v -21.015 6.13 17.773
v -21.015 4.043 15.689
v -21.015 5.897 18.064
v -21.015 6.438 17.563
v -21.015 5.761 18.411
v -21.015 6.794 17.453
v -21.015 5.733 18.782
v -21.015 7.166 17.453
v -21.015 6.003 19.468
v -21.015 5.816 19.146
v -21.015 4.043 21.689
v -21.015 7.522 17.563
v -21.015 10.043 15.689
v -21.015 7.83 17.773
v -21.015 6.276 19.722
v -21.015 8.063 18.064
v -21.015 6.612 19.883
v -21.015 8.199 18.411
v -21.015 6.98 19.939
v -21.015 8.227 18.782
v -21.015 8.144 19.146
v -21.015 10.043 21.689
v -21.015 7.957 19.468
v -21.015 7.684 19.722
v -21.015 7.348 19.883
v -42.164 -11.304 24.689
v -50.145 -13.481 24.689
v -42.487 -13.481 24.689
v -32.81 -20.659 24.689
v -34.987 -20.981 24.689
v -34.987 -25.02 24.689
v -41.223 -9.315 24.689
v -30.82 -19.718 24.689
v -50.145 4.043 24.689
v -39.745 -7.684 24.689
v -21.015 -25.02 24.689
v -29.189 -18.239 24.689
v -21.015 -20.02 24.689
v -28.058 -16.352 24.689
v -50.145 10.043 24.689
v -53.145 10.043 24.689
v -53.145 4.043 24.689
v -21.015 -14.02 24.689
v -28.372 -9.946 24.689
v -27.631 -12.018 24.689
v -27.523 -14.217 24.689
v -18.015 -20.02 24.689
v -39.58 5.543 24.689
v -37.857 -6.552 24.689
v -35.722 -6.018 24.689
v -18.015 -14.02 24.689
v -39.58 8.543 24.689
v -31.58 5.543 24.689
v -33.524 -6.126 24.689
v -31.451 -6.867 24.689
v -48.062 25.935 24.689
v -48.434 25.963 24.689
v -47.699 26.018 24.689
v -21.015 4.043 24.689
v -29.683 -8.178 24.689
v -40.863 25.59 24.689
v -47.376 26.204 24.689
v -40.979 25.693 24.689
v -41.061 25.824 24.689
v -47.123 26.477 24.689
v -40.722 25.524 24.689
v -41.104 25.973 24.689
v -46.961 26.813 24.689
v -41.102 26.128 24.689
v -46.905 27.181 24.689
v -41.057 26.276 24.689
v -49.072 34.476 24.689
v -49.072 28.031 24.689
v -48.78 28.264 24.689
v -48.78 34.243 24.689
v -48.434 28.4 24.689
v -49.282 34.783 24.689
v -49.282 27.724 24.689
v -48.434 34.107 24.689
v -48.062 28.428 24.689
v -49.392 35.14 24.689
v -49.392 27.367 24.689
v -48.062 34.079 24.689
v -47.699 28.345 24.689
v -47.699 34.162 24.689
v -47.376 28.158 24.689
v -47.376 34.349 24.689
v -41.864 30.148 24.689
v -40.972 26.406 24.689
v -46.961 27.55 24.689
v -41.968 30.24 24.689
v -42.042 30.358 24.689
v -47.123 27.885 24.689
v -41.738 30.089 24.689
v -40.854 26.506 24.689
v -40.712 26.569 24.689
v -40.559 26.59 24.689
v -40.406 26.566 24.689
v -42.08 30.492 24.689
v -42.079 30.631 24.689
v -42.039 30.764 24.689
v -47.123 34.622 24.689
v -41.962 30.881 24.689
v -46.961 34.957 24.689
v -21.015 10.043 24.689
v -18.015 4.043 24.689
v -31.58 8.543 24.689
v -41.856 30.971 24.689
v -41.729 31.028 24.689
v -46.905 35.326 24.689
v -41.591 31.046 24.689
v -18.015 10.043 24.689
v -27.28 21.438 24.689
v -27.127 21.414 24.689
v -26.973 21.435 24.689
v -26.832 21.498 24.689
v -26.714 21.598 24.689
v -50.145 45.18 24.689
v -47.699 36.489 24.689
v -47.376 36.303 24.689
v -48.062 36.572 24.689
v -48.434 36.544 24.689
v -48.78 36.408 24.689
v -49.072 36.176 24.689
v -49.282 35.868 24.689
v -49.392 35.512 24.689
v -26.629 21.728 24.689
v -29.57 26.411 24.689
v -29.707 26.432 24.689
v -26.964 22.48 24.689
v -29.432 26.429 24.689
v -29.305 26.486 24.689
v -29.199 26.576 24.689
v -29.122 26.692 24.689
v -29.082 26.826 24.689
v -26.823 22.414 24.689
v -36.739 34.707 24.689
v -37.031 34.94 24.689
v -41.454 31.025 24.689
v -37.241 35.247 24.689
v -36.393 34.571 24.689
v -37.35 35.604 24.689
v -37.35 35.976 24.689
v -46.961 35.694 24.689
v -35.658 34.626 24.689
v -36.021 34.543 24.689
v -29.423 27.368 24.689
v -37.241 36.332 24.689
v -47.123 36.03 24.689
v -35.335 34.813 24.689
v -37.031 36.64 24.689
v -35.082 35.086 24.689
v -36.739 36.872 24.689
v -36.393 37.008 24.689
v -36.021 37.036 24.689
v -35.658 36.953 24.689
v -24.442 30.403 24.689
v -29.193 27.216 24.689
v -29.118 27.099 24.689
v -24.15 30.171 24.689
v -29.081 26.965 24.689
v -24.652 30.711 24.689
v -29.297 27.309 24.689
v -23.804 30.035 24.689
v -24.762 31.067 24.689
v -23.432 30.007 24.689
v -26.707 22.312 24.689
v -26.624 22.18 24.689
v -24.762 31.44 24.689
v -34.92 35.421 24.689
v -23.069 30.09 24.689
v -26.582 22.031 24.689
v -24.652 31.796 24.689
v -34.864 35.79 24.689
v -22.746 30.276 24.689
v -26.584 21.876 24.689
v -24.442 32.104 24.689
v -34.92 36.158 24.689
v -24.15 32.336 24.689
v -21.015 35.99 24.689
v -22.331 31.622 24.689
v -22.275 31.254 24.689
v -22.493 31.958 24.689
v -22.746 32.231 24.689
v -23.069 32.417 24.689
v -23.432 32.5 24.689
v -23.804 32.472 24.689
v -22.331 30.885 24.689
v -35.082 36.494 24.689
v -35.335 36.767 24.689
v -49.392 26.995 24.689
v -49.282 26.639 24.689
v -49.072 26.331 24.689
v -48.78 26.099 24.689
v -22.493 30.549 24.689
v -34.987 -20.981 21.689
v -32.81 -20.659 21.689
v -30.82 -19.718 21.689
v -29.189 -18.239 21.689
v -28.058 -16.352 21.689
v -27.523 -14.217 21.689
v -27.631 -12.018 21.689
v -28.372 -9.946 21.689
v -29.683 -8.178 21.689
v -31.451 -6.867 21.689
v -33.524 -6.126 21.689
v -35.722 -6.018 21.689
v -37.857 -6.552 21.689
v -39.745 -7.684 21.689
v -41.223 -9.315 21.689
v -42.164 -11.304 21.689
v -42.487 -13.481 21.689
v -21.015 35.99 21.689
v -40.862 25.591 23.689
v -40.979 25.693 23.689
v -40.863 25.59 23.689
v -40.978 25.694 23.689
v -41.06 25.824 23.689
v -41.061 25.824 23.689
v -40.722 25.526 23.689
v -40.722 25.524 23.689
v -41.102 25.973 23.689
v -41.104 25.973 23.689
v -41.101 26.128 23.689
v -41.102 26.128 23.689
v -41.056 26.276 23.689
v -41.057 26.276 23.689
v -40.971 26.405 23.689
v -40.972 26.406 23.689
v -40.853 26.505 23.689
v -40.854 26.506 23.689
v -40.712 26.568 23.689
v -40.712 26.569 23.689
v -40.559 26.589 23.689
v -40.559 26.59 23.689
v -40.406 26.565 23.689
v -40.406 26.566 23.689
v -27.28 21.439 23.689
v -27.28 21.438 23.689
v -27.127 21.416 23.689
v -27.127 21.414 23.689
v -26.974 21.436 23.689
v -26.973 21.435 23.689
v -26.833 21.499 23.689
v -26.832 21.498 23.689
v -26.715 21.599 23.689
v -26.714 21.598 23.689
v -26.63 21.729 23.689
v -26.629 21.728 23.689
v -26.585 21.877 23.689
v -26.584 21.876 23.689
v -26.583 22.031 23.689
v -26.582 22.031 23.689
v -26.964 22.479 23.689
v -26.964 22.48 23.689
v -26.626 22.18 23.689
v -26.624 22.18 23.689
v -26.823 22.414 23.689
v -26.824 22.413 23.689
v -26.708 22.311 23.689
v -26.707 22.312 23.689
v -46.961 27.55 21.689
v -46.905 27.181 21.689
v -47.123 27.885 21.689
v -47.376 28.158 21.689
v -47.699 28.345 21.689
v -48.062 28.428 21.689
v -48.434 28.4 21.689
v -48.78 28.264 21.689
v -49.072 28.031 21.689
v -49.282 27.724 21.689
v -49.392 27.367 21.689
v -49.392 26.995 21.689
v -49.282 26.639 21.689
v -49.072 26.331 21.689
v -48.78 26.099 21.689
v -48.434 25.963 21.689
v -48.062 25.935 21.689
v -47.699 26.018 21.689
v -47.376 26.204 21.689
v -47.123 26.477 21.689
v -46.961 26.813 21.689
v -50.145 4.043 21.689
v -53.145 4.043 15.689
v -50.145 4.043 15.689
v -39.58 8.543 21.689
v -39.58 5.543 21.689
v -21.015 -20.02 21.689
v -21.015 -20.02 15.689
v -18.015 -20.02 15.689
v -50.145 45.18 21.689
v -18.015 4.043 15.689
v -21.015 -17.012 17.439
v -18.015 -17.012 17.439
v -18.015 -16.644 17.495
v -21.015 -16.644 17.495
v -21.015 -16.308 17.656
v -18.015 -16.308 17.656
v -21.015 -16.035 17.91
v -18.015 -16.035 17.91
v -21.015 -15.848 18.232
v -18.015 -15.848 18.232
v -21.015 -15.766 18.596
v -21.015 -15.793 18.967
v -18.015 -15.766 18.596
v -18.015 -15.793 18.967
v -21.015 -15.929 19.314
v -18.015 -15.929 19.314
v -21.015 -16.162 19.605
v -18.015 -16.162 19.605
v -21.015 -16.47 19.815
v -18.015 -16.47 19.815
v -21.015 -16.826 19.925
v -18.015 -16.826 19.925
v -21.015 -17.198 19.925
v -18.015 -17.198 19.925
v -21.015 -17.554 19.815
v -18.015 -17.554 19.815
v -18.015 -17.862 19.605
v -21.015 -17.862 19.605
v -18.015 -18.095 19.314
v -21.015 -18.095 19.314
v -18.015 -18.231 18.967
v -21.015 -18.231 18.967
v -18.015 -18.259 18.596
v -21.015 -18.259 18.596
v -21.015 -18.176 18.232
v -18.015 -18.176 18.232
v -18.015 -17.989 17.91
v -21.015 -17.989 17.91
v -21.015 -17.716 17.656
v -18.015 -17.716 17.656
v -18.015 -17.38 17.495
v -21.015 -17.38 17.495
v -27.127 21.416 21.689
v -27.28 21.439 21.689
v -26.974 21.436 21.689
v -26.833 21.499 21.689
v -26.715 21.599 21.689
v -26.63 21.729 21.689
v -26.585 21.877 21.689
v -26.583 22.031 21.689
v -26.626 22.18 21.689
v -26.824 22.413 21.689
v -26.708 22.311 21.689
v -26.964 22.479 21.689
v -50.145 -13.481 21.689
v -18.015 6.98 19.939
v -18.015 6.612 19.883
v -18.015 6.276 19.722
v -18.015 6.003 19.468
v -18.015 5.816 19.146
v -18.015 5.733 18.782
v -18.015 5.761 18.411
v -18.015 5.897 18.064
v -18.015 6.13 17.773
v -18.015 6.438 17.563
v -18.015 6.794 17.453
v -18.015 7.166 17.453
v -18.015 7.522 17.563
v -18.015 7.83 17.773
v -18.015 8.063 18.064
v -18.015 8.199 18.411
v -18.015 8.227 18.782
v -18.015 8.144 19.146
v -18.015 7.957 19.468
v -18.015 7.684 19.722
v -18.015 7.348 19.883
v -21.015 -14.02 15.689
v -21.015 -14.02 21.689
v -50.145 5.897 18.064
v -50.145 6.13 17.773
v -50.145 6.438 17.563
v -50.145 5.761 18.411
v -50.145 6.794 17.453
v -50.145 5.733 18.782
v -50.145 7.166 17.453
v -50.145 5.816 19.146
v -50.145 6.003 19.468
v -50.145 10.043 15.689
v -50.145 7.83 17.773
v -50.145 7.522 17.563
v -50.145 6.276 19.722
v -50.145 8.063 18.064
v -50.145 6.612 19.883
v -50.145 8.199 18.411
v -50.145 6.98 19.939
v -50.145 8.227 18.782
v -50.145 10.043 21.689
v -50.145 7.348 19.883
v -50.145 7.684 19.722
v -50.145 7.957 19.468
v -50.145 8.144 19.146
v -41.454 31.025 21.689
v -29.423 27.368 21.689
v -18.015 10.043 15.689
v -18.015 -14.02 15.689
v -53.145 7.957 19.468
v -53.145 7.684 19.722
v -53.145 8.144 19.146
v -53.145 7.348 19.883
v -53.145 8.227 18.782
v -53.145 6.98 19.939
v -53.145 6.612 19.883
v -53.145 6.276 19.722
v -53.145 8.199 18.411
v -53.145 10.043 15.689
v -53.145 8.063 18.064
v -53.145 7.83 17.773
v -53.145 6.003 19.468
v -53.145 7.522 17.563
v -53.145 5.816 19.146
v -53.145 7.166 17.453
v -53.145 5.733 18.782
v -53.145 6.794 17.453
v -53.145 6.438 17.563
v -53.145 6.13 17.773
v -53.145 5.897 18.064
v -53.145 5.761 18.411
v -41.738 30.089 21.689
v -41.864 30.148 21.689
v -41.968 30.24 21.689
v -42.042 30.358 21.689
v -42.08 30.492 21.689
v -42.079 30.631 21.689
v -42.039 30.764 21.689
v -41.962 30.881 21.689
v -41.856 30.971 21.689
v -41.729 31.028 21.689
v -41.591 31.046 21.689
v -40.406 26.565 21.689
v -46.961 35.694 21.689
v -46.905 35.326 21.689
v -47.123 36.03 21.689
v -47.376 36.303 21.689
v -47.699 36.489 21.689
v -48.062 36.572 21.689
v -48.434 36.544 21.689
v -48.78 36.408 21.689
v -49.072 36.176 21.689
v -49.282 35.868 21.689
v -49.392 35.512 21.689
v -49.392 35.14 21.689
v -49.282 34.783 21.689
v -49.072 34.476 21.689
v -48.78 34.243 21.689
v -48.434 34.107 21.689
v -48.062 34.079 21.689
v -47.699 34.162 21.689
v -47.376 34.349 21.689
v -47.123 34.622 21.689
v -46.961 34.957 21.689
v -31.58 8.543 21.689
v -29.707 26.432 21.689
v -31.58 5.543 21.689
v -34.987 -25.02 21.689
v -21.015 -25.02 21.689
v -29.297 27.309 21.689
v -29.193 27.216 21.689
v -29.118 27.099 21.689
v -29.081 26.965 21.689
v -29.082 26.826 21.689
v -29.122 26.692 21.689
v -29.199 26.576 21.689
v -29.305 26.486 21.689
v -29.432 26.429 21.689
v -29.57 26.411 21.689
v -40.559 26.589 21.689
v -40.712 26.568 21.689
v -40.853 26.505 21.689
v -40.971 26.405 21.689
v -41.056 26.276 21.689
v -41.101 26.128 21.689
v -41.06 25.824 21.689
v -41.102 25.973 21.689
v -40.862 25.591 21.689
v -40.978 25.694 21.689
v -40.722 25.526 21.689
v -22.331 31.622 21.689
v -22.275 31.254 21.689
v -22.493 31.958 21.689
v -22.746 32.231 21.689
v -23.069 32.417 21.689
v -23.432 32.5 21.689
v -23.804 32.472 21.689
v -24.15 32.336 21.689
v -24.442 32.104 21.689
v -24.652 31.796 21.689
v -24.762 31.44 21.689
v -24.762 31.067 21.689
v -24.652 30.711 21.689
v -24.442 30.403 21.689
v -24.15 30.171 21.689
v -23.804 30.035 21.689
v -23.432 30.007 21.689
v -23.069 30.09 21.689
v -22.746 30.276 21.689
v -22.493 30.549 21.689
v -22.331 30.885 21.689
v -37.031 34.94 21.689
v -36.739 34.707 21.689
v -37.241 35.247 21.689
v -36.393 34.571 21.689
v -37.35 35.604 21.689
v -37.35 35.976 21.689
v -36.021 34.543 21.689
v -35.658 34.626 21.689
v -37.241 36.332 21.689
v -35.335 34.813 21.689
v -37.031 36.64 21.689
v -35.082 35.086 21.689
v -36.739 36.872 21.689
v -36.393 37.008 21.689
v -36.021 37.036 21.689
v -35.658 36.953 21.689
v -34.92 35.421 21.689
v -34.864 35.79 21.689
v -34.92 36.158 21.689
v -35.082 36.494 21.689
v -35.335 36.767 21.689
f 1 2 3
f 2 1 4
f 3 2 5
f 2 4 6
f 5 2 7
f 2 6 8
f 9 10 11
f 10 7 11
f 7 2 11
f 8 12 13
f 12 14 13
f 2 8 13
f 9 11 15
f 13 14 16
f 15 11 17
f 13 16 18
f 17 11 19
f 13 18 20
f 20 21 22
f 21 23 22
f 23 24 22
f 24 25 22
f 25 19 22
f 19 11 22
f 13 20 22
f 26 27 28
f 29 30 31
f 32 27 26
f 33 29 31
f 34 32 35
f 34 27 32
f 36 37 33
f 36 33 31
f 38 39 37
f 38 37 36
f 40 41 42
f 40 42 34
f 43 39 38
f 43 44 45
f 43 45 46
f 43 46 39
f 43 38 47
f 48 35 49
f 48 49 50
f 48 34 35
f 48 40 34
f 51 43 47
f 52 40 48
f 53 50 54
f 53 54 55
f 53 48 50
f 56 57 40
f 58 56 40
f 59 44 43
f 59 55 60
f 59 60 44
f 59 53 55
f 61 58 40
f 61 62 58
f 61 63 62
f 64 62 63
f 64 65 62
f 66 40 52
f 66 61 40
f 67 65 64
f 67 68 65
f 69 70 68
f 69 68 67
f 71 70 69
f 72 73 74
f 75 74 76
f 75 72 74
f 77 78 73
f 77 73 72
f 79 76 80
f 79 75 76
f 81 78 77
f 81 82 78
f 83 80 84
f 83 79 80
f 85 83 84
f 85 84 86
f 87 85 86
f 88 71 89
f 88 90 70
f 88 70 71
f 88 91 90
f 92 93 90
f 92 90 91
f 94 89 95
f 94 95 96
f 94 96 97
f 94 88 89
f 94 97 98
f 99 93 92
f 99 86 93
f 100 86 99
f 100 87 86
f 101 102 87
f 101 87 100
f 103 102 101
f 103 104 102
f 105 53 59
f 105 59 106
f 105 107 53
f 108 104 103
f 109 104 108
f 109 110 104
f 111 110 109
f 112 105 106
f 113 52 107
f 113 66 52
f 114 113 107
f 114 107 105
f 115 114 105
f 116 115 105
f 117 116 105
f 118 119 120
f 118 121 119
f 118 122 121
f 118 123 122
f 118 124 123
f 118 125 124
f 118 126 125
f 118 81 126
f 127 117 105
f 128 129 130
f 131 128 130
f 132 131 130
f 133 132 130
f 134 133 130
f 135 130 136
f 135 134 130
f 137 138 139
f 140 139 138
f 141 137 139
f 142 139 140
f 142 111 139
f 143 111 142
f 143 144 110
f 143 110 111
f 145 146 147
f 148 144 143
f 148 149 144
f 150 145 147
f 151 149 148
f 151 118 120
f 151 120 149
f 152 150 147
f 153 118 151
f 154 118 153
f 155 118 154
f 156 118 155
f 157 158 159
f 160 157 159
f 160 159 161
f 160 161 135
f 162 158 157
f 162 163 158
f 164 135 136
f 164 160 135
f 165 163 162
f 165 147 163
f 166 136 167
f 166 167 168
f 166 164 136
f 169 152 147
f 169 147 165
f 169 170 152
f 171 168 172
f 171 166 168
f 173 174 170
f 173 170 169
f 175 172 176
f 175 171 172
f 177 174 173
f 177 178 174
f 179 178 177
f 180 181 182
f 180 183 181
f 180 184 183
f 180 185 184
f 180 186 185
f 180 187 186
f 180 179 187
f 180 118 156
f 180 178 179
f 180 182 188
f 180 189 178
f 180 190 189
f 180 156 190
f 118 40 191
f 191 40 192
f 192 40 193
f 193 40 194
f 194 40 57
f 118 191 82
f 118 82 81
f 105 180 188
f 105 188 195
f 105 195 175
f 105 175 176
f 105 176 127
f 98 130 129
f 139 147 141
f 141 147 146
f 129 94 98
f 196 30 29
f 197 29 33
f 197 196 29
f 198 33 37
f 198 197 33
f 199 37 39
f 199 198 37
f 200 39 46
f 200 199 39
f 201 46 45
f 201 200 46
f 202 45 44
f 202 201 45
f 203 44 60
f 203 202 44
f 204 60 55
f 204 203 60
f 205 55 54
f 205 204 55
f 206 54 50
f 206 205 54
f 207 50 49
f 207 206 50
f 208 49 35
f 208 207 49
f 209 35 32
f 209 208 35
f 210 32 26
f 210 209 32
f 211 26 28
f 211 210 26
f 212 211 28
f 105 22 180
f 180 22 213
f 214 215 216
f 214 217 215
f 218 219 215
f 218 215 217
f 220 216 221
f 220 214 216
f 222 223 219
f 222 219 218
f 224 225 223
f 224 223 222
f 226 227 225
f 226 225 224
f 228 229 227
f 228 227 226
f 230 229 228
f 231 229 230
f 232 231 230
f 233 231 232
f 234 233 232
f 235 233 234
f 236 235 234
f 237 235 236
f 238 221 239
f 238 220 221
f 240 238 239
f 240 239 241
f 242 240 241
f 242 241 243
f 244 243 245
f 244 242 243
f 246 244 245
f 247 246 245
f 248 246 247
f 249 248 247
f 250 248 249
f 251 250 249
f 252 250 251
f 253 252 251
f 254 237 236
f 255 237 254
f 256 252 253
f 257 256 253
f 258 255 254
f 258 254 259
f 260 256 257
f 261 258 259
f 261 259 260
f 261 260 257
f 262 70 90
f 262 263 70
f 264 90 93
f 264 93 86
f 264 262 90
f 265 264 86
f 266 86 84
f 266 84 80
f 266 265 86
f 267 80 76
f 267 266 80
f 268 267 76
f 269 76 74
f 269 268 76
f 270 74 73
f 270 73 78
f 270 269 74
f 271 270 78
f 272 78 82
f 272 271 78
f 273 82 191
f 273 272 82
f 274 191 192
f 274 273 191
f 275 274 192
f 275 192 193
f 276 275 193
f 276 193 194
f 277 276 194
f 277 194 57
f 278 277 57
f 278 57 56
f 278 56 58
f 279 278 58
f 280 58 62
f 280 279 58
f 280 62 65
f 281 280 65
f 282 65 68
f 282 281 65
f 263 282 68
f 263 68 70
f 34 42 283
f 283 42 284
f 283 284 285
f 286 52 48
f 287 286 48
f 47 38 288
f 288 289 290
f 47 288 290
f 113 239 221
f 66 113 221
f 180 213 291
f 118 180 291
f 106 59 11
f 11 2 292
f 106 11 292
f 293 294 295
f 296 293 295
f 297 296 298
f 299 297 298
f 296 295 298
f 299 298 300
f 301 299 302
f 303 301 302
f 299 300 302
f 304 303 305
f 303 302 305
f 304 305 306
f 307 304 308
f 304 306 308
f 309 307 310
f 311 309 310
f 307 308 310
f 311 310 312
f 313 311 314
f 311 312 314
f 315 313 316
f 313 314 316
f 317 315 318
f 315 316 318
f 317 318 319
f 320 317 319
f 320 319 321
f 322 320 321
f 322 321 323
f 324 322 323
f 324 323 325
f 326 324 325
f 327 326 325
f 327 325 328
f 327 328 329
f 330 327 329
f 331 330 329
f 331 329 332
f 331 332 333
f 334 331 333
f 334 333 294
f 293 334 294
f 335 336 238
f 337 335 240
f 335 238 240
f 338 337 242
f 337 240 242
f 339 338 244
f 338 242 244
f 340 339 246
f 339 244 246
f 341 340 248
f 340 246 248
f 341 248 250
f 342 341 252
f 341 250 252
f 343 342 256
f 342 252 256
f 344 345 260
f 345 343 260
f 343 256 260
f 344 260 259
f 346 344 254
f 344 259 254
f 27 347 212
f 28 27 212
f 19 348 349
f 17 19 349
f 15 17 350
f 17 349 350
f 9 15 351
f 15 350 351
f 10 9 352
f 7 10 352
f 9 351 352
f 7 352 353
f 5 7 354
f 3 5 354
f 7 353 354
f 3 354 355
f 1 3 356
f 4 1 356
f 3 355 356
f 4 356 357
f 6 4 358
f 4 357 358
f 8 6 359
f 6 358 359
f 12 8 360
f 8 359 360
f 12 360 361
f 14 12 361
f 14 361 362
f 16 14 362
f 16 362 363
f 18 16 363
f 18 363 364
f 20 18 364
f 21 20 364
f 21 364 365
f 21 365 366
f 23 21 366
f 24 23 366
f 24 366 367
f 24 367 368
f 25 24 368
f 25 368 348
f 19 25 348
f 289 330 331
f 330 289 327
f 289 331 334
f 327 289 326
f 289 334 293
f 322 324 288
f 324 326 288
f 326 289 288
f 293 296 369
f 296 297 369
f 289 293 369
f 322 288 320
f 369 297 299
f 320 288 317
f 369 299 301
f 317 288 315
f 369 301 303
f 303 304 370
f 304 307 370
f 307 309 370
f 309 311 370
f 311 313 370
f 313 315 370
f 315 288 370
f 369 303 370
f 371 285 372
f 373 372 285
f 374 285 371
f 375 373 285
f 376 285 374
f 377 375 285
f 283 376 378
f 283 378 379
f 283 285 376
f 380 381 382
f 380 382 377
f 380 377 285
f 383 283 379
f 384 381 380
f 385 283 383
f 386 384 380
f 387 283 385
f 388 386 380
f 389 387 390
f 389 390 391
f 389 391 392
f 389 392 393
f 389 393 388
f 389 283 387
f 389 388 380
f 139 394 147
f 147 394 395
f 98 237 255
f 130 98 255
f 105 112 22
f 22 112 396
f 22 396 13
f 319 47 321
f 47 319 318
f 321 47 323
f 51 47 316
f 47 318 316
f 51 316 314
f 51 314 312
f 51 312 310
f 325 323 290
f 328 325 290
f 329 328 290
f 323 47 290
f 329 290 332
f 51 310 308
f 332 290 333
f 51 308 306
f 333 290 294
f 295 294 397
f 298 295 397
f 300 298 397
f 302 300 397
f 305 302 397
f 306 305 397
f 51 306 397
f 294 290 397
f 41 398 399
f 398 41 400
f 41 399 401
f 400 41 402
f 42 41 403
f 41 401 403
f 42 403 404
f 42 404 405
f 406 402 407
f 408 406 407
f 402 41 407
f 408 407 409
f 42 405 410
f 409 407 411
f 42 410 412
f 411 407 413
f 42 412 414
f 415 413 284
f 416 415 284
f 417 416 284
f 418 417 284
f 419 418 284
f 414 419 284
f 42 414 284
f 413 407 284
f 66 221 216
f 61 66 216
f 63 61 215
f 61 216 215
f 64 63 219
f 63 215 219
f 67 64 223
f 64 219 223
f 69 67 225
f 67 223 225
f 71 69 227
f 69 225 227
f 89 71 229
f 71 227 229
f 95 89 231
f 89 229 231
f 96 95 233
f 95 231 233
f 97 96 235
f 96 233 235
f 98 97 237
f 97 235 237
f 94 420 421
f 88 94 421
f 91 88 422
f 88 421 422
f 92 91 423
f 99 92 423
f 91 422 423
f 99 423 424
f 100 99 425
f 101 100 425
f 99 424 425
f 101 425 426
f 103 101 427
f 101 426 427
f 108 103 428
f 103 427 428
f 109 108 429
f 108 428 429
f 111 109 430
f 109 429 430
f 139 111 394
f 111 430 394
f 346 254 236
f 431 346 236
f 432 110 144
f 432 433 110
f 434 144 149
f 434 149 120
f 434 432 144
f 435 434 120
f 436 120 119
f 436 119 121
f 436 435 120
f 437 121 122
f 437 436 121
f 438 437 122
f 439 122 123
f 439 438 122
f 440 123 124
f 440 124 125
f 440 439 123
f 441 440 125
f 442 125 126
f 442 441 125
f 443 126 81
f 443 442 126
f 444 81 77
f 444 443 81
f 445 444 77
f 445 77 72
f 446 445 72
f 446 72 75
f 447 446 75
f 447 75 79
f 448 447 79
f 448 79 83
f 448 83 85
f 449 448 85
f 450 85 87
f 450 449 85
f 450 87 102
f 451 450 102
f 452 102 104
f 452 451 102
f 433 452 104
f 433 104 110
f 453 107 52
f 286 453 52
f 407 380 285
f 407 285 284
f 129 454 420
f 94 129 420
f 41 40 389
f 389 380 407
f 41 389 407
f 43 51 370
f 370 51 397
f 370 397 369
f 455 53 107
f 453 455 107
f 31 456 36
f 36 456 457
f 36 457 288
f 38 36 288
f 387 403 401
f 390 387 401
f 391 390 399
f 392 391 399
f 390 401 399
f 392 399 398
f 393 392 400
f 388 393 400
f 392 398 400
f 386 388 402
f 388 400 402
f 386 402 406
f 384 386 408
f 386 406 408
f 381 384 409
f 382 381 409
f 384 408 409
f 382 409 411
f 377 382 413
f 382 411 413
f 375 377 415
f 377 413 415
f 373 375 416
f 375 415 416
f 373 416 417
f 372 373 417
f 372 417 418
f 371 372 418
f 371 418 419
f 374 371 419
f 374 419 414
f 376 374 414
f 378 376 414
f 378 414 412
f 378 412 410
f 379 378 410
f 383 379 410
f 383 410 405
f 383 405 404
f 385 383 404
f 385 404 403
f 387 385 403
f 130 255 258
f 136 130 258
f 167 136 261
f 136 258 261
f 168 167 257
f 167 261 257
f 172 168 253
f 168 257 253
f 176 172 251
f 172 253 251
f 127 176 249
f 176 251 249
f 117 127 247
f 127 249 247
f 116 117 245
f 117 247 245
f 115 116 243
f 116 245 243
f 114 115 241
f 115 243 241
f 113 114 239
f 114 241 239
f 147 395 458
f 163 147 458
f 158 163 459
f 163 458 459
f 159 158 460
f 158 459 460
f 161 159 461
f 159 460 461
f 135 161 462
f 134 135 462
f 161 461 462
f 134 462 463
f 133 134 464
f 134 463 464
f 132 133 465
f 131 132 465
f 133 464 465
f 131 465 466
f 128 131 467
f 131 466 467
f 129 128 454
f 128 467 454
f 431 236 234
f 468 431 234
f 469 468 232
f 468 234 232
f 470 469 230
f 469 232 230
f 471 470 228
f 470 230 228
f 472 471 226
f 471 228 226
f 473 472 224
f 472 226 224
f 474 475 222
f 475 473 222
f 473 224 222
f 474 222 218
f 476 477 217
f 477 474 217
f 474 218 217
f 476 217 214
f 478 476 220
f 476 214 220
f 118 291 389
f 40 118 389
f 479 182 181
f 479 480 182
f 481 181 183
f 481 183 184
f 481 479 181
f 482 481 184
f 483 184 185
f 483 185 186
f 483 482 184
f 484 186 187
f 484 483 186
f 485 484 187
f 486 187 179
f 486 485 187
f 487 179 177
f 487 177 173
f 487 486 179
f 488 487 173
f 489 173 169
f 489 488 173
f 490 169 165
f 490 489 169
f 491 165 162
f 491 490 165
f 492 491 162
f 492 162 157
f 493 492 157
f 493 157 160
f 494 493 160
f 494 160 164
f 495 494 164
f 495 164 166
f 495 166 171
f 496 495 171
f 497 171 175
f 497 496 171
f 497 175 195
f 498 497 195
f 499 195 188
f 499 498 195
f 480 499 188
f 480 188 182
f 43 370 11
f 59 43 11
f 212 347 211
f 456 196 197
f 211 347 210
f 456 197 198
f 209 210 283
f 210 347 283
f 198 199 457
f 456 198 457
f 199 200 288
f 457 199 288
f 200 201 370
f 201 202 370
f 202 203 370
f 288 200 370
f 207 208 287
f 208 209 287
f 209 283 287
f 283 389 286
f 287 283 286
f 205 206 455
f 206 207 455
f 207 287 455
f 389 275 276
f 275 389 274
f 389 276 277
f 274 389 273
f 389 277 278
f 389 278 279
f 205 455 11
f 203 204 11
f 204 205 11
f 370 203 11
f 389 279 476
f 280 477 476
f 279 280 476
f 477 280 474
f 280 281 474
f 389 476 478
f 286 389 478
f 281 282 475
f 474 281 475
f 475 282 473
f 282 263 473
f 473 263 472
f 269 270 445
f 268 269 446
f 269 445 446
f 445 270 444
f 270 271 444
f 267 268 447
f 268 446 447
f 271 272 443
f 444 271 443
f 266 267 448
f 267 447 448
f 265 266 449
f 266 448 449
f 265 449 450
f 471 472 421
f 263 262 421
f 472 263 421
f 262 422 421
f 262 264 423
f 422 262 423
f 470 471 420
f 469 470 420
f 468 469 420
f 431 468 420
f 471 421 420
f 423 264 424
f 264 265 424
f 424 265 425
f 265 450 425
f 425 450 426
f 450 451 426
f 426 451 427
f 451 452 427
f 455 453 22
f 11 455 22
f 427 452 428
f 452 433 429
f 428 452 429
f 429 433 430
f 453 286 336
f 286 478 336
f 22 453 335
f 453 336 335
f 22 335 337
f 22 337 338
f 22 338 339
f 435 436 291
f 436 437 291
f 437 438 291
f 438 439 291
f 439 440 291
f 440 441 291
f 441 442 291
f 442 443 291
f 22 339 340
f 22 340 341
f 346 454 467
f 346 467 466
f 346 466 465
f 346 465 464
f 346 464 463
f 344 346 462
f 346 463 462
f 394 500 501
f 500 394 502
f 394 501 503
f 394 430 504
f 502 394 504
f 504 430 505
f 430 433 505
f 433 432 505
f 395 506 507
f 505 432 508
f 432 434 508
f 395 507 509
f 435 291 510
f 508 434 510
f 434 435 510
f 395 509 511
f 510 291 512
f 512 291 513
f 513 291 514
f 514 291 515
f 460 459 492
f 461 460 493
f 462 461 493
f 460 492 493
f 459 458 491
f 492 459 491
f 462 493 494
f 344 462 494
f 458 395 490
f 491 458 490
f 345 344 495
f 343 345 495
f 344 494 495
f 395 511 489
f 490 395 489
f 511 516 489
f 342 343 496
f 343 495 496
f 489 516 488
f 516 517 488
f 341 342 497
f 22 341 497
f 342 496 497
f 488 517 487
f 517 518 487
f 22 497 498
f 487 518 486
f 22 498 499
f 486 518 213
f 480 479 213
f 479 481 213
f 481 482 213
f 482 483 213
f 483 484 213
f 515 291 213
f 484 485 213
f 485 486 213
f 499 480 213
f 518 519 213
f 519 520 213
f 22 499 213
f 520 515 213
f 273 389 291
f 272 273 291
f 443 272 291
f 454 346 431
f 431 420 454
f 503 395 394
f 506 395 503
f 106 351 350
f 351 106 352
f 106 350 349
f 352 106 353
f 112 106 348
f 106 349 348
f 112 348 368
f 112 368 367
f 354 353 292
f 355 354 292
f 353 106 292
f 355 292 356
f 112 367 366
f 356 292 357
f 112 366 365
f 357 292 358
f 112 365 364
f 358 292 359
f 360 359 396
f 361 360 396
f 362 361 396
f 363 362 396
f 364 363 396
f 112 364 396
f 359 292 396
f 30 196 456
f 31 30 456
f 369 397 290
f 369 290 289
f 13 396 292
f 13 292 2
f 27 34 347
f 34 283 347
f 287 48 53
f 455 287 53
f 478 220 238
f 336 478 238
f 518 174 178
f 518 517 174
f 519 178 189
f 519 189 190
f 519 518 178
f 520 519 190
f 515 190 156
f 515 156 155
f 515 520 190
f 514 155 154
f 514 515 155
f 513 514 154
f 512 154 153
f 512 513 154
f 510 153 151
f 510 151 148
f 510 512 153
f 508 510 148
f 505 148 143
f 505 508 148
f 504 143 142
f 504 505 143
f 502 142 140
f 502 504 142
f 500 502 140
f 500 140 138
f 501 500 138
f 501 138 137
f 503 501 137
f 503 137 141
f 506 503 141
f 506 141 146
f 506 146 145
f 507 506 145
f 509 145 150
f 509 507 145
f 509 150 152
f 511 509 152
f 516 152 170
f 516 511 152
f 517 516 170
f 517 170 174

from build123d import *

# Parameters (mm, degrees)
SKETCH1_W                 = 29.13
SKETCH1_H                 = 2
BOSS_EXTRUDE1_DEPTH       = 45.22
SKETCH15_W                = 3.835
SKETCH15_H                = 2
BOSS_EXTRUDE7_DEPTH       = 25.02
CUT_EXTRUDE5_DEPTH        = 4
SKETCH19_W                = 2
SKETCH19_H                = 6
BOSS_EXTRUDE9_DEPTH       = 3
SKETCH20_W                = 3
SKETCH20_H                = 6
BOSS_EXTRUDE10_DEPTH      = 6
SKETCH21_R                = 1.25
CUT_EXTRUDE6_DEPTH        = 6
CUT_EXTRUDE10_DEPTH       = 4
SKETCH27_R                = 1.25
CUT_EXTRUDE13_DEPTH       = 5
CUT_EXTRUDE16_DEPTH       = 4.86
CUT_EXTRUDE17_DEPTH       = 4
CUT_EXTRUDE20_DEPTH       = 15
SKETCH28_R                = 1.25
CUT_EXTRUDE23_DEPTH       = 5
SKETCH32_R                = 1.25
CUT_EXTRUDE25_DEPTH       = 5
SKETCH38_W                = 2
SKETCH38_H                = 6
BOSS_EXTRUDE11_DEPTH      = 3
SKETCH39_W                = 3
SKETCH39_H                = 6
BOSS_EXTRUDE12_DEPTH      = 6
SKETCH40_R                = 1.250000005
CUT_EXTRUDE26_DEPTH       = 6
SKETCH51_W                = 2
SKETCH51_H                = 6
BOSS_EXTRUDE15_DEPTH      = 3
SKETCH52_W                = 3
SKETCH52_H                = 6
BOSS_EXTRUDE16_DEPTH      = 6
SKETCH53_R                = 1.249999995
CUT_EXTRUDE28_DEPTH       = 6
BOSS_EXTRUDE17_DEPTH      = 1
BOSS_EXTRUDE17_DEPTH_BACK = 2
CUT_EXTRUDE29_DEPTH       = 1
CUT_EXTRUDE29_DEPTH_BACK  = 2
SKETCH54_3_R              = 7.5
BOSS_EXTRUDE18_DEPTH      = 1
BOSS_EXTRUDE18_DEPTH_BACK = 2
SKETCH55_R                = 1.25
CUT_EXTRUDE30_DEPTH       = 10


with BuildPart() as part:
    # Sketch1 → Boss-Extrude1 (new body)
    with BuildSketch(Plane(origin=(0, 0, 0), x_dir=(1, 0, 0), z_dir=(0, 1, 0))):
        with Locations((-35.580481579, -22.688974349)):
            Rectangle(SKETCH1_W, SKETCH1_H)
    extrude(amount=BOSS_EXTRUDE1_DEPTH)

    # Sketch15 → Boss-Extrude7 (add)
    with BuildSketch(Plane.XZ):
        with Locations((-22.932981579, 22.688974349)):
            Rectangle(SKETCH15_W, SKETCH15_H)
    extrude(amount=BOSS_EXTRUDE7_DEPTH)

    # Sketch16 → Cut-Extrude5 (cut)
    with BuildSketch(Plane.XY.offset(23.688974349)):
        Polygon((-24.850481579, 0), (-21.015481579, -25.02), (-24.850481579, -25.02), align=None)
    extrude(amount=-CUT_EXTRUDE5_DEPTH, mode=Mode.SUBTRACT)

    # Sketch19 → Boss-Extrude9 (add)
    with BuildSketch(Plane(origin=(-21.015481579, 0, 0), x_dir=(0, 0, -1), z_dir=(1, 0, 0))):
        with Locations((-22.688974349, -17.02)):
            Rectangle(SKETCH19_W, SKETCH19_H)
    extrude(amount=BOSS_EXTRUDE9_DEPTH)

    # Sketch20 → Boss-Extrude10 (add)
    with BuildSketch(Plane(origin=(0, 0, 21.688974349), x_dir=(-1, 0, 0), z_dir=(0, 0, -1))):
        with Locations((19.515481579, -17.02)):
            Rectangle(SKETCH20_W, SKETCH20_H)
    extrude(amount=BOSS_EXTRUDE10_DEPTH)

    # Sketch21 → Cut-Extrude6 (cut)
    with BuildSketch(Plane(origin=(-18.015481579, 0, 0), x_dir=(0, 0, -1), z_dir=(1, 0, 0))):
        with Locations((-18.688974344, -17.012020694)):
            Circle(SKETCH21_R)
    extrude(amount=-CUT_EXTRUDE6_DEPTH, mode=Mode.SUBTRACT)

    # Sketch24 → Cut-Extrude10 (cut)
    with BuildSketch(Plane.XY.offset(23.688974349)):
        Polygon((-21.015481579, 45.22), (-21.015481579, 37.57), (-50.145481579, 45.22), align=None)
    extrude(amount=-CUT_EXTRUDE10_DEPTH, mode=Mode.SUBTRACT)

    # Sketch27 → Cut-Extrude13 (cut)
    with BuildSketch(Plane.XY.offset(23.688974349)):
        with Locations((-48.155481578, 35.325814088)):
            Circle(SKETCH27_R)
        with Locations((-48.155481579, 27.181192798)):
            Circle(SKETCH27_R)
    extrude(amount=-CUT_EXTRUDE13_DEPTH, mode=Mode.SUBTRACT)

    # Sketch35 → Cut-Extrude16 (cut)
    with BuildSketch(Plane.XY.offset(23.688974349)):
        Polygon((-21.015481579, 35.99), (-21.015481579, 37.57), (-50.145481579, 45.22), align=None)
    extrude(amount=-CUT_EXTRUDE16_DEPTH, mode=Mode.SUBTRACT)

    # Sketch36 → Cut-Extrude17 (cut)
    with BuildSketch(Plane.XY.offset(23.688974349)):
        Polygon((-50.145481579, 45.22), (-50.145481579, 45.18), (-21.015481579, 35.99), align=None)
    extrude(amount=-CUT_EXTRUDE17_DEPTH, mode=Mode.SUBTRACT)


with BuildPart() as body_2:
    # Mirror1: mirrored copy
    add(part.part.mirror(Plane(origin=(0, 0, 15.688974349), x_dir=(1, 0, 0), z_dir=(0, 0, -1))))

    # Sketch37 → Cut-Extrude20 (cut)
    with BuildSketch(Plane(origin=(0, 0, 7.688974349), x_dir=(-1, 0, 0), z_dir=(0, 0, -1))):
        with BuildLine():
            Line((29.422391304, 27.369440111), (41.452993211, 31.026802565))
            ThreePointArc((41.452993211, 31.026802565), (42.065476612, 30.699897808), (41.738571855, 30.087414406))
            Line((41.738571855, 30.087414406), (29.707969948, 26.430051952))
            ThreePointArc((29.707969948, 26.430051952), (29.095486546, 26.75695671), (29.422391304, 27.369440111))
        make_face()
        with BuildLine():
            Line((26.963881394, 22.478846245), (40.405895564, 26.565285004))
            ThreePointArc((40.405895564, 26.565285004), (41.083801623, 26.203461785), (40.721978404, 25.525555725))
            Line((40.721978404, 25.525555725), (27.279964235, 21.439116966))
            ThreePointArc((27.279964235, 21.439116966), (26.602058175, 21.800940185), (26.963881394, 22.478846245))
        make_face()
    extrude(amount=-CUT_EXTRUDE20_DEPTH, mode=Mode.SUBTRACT)


with BuildPart() as body_2_2:
    # Mirror2: mirrored copy
    add(body_2.part.mirror(Plane.XY.offset(15.688974349)))

    # Sketch28 → Cut-Extrude23 (cut)
    with BuildSketch(Plane.XY.offset(23.688974349)):
        with Locations((-23.525481579, 31.253503442)):
            Circle(SKETCH28_R)
    extrude(amount=-CUT_EXTRUDE23_DEPTH, mode=Mode.SUBTRACT)

    # Sketch32 → Cut-Extrude25 (cut)
    with BuildSketch(Plane.XY.offset(23.688974349)):
        with Locations((-36.114456583, 35.789812976)):
            Circle(SKETCH32_R)
    extrude(amount=-CUT_EXTRUDE25_DEPTH, mode=Mode.SUBTRACT)

    # Sketch38 → Boss-Extrude11 (add)
    with BuildSketch(Plane.ZY.offset(50.145481579)):
        with Locations((22.688974349, 7.042669101)):
            Rectangle(SKETCH38_W, SKETCH38_H)
    extrude(amount=BOSS_EXTRUDE11_DEPTH)

    # Sketch39 → Boss-Extrude12 (add)
    with BuildSketch(Plane(origin=(0, 0, 21.688974349), x_dir=(-1, 0, 0), z_dir=(0, 0, -1))):
        with Locations((51.645481579, 7.042669101)):
            Rectangle(SKETCH39_W, SKETCH39_H)
    extrude(amount=BOSS_EXTRUDE12_DEPTH)

    # Sketch40 → Cut-Extrude26 (cut)
    with BuildSketch(Plane.ZY.offset(53.145481579)):
        with Locations((18.688974344, 6.98)):
            Circle(SKETCH40_R)
    extrude(amount=-CUT_EXTRUDE26_DEPTH, mode=Mode.SUBTRACT)

    # Sketch51 → Boss-Extrude15 (add)
    with BuildSketch(Plane(origin=(-21.015481579, 0, 0), x_dir=(0, 0, -1), z_dir=(1, 0, 0))):
        with Locations((-22.688974349, 7.042669101)):
            Rectangle(SKETCH51_W, SKETCH51_H)
    extrude(amount=BOSS_EXTRUDE15_DEPTH)

    # Sketch52 → Boss-Extrude16 (add)
    with BuildSketch(Plane(origin=(0, 0, 21.688974349), x_dir=(-1, 0, 0), z_dir=(0, 0, -1))):
        with Locations((19.515481579, 7.042669101)):
            Rectangle(SKETCH52_W, SKETCH52_H)
    extrude(amount=BOSS_EXTRUDE16_DEPTH)

    # Sketch53 → Cut-Extrude28 (cut)
    with BuildSketch(Plane(origin=(-18.015481579, 0, 0), x_dir=(0, 0, -1), z_dir=(1, 0, 0))):
        with Locations(Location((-18.688974344, 6.98, 0), (0, 0, 180))):
            Circle(SKETCH53_R)
    extrude(amount=-CUT_EXTRUDE28_DEPTH, mode=Mode.SUBTRACT)

    # Sketch54 → Boss-Extrude17 (add, two sides: drawn at the far end of the back side and taken through both)
    with BuildSketch(Plane.XY.offset(23.688974349).offset(-BOSS_EXTRUDE17_DEPTH_BACK)):
        Polygon((-50.145481579, 0), (-50.145481579, -13.48149478), (-34.98674486, -13.48149478), (-34.98674486, -25.02), (-21.015481579, -25.02), (-24.850481579, 0), align=None)
    extrude(amount=BOSS_EXTRUDE17_DEPTH + BOSS_EXTRUDE17_DEPTH_BACK)

    # Sketch54<3> → Cut-Extrude29 (cut, two sides: drawn at the far end of the back side and taken through both)
    with BuildSketch(Plane.XY.offset(23.688974349).offset(-CUT_EXTRUDE29_DEPTH_BACK)):
        with Locations((-34.98674486, -13.48149478)):
            Circle(SKETCH54_3_R)
    extrude(amount=CUT_EXTRUDE29_DEPTH + CUT_EXTRUDE29_DEPTH_BACK, mode=Mode.SUBTRACT)

    # Sketch55 → Boss-Extrude18 (add, two sides: drawn at the far end of the back side and taken through both)
    with BuildSketch(Plane.XY.offset(23.688974349).offset(-BOSS_EXTRUDE18_DEPTH_BACK)):
        Polygon((-50.145481579, 45.18), (-50.145481579, 10.042669101), (-53.145481579, 10.042669101), (-53.145481579, 4.042669101), (-50.145481579, 4.042669101), (-50.145481579, 0), (-24.850481579, 0), (-21.015481579, -25.02), (-21.015481579, -20.02), (-18.015481579, -20.02), (-18.015481579, -14.02), (-21.015481579, -14.02), (-21.015481579, 4.042669101), (-18.015481579, 4.042669101), (-18.015481579, 10.042669101), (-21.015481579, 10.042669101), (-21.015481579, 35.99), align=None)
        with Locations((-23.525481579, 31.253503442)):
            Circle(SKETCH55_R, mode=Mode.SUBTRACT)
        with Locations((-36.114456583, 35.789812976)):
            Circle(SKETCH55_R, mode=Mode.SUBTRACT)
        with Locations((-48.155481578, 35.325814088)):
            Circle(SKETCH55_R, mode=Mode.SUBTRACT)
        with Locations((-48.155481579, 27.181192798)):
            Circle(SKETCH55_R, mode=Mode.SUBTRACT)
        with BuildLine():
            Line((-41.453555794, 31.024951992), (-29.422953887, 27.367589538))
            ThreePointArc((-29.422953887, 27.367589538), (-29.097337119, 26.757519293), (-29.707407364, 26.431902525))
            Line((-29.707407364, 26.431902525), (-41.738009272, 30.089264979))
            ThreePointArc((-41.738009272, 30.089264979), (-42.063626039, 30.699335224), (-41.453555794, 31.024951992))
        make_face(mode=Mode.SUBTRACT)
        with BuildLine():
            Line((-27.280327459, 21.437922169), (-40.722341628, 25.524360928))
            ThreePointArc((-40.722341628, 25.524360928), (-41.08499642, 26.203825009), (-40.405532339, 26.566479801))
            Line((-40.405532339, 26.566479801), (-26.96351817, 22.480041042))
            ThreePointArc((-26.96351817, 22.480041042), (-26.600863378, 21.800576961), (-27.280327459, 21.437922169))
        make_face(mode=Mode.SUBTRACT)
    extrude(amount=BOSS_EXTRUDE18_DEPTH + BOSS_EXTRUDE18_DEPTH_BACK)

    # Sketch56 → Cut-Extrude30 (cut)
    with BuildSketch(Plane.XY.offset(24.688974349)):
        Polygon((-31.58048158, 8.542669101), (-35.580481579, 8.542669101), (-39.58048158, 8.542669101), (-39.58048158, 5.542669101), (-31.58048158, 5.542669101), align=None)
    extrude(amount=-CUT_EXTRUDE30_DEPTH, mode=Mode.SUBTRACT)


solid = body_2_2.part
